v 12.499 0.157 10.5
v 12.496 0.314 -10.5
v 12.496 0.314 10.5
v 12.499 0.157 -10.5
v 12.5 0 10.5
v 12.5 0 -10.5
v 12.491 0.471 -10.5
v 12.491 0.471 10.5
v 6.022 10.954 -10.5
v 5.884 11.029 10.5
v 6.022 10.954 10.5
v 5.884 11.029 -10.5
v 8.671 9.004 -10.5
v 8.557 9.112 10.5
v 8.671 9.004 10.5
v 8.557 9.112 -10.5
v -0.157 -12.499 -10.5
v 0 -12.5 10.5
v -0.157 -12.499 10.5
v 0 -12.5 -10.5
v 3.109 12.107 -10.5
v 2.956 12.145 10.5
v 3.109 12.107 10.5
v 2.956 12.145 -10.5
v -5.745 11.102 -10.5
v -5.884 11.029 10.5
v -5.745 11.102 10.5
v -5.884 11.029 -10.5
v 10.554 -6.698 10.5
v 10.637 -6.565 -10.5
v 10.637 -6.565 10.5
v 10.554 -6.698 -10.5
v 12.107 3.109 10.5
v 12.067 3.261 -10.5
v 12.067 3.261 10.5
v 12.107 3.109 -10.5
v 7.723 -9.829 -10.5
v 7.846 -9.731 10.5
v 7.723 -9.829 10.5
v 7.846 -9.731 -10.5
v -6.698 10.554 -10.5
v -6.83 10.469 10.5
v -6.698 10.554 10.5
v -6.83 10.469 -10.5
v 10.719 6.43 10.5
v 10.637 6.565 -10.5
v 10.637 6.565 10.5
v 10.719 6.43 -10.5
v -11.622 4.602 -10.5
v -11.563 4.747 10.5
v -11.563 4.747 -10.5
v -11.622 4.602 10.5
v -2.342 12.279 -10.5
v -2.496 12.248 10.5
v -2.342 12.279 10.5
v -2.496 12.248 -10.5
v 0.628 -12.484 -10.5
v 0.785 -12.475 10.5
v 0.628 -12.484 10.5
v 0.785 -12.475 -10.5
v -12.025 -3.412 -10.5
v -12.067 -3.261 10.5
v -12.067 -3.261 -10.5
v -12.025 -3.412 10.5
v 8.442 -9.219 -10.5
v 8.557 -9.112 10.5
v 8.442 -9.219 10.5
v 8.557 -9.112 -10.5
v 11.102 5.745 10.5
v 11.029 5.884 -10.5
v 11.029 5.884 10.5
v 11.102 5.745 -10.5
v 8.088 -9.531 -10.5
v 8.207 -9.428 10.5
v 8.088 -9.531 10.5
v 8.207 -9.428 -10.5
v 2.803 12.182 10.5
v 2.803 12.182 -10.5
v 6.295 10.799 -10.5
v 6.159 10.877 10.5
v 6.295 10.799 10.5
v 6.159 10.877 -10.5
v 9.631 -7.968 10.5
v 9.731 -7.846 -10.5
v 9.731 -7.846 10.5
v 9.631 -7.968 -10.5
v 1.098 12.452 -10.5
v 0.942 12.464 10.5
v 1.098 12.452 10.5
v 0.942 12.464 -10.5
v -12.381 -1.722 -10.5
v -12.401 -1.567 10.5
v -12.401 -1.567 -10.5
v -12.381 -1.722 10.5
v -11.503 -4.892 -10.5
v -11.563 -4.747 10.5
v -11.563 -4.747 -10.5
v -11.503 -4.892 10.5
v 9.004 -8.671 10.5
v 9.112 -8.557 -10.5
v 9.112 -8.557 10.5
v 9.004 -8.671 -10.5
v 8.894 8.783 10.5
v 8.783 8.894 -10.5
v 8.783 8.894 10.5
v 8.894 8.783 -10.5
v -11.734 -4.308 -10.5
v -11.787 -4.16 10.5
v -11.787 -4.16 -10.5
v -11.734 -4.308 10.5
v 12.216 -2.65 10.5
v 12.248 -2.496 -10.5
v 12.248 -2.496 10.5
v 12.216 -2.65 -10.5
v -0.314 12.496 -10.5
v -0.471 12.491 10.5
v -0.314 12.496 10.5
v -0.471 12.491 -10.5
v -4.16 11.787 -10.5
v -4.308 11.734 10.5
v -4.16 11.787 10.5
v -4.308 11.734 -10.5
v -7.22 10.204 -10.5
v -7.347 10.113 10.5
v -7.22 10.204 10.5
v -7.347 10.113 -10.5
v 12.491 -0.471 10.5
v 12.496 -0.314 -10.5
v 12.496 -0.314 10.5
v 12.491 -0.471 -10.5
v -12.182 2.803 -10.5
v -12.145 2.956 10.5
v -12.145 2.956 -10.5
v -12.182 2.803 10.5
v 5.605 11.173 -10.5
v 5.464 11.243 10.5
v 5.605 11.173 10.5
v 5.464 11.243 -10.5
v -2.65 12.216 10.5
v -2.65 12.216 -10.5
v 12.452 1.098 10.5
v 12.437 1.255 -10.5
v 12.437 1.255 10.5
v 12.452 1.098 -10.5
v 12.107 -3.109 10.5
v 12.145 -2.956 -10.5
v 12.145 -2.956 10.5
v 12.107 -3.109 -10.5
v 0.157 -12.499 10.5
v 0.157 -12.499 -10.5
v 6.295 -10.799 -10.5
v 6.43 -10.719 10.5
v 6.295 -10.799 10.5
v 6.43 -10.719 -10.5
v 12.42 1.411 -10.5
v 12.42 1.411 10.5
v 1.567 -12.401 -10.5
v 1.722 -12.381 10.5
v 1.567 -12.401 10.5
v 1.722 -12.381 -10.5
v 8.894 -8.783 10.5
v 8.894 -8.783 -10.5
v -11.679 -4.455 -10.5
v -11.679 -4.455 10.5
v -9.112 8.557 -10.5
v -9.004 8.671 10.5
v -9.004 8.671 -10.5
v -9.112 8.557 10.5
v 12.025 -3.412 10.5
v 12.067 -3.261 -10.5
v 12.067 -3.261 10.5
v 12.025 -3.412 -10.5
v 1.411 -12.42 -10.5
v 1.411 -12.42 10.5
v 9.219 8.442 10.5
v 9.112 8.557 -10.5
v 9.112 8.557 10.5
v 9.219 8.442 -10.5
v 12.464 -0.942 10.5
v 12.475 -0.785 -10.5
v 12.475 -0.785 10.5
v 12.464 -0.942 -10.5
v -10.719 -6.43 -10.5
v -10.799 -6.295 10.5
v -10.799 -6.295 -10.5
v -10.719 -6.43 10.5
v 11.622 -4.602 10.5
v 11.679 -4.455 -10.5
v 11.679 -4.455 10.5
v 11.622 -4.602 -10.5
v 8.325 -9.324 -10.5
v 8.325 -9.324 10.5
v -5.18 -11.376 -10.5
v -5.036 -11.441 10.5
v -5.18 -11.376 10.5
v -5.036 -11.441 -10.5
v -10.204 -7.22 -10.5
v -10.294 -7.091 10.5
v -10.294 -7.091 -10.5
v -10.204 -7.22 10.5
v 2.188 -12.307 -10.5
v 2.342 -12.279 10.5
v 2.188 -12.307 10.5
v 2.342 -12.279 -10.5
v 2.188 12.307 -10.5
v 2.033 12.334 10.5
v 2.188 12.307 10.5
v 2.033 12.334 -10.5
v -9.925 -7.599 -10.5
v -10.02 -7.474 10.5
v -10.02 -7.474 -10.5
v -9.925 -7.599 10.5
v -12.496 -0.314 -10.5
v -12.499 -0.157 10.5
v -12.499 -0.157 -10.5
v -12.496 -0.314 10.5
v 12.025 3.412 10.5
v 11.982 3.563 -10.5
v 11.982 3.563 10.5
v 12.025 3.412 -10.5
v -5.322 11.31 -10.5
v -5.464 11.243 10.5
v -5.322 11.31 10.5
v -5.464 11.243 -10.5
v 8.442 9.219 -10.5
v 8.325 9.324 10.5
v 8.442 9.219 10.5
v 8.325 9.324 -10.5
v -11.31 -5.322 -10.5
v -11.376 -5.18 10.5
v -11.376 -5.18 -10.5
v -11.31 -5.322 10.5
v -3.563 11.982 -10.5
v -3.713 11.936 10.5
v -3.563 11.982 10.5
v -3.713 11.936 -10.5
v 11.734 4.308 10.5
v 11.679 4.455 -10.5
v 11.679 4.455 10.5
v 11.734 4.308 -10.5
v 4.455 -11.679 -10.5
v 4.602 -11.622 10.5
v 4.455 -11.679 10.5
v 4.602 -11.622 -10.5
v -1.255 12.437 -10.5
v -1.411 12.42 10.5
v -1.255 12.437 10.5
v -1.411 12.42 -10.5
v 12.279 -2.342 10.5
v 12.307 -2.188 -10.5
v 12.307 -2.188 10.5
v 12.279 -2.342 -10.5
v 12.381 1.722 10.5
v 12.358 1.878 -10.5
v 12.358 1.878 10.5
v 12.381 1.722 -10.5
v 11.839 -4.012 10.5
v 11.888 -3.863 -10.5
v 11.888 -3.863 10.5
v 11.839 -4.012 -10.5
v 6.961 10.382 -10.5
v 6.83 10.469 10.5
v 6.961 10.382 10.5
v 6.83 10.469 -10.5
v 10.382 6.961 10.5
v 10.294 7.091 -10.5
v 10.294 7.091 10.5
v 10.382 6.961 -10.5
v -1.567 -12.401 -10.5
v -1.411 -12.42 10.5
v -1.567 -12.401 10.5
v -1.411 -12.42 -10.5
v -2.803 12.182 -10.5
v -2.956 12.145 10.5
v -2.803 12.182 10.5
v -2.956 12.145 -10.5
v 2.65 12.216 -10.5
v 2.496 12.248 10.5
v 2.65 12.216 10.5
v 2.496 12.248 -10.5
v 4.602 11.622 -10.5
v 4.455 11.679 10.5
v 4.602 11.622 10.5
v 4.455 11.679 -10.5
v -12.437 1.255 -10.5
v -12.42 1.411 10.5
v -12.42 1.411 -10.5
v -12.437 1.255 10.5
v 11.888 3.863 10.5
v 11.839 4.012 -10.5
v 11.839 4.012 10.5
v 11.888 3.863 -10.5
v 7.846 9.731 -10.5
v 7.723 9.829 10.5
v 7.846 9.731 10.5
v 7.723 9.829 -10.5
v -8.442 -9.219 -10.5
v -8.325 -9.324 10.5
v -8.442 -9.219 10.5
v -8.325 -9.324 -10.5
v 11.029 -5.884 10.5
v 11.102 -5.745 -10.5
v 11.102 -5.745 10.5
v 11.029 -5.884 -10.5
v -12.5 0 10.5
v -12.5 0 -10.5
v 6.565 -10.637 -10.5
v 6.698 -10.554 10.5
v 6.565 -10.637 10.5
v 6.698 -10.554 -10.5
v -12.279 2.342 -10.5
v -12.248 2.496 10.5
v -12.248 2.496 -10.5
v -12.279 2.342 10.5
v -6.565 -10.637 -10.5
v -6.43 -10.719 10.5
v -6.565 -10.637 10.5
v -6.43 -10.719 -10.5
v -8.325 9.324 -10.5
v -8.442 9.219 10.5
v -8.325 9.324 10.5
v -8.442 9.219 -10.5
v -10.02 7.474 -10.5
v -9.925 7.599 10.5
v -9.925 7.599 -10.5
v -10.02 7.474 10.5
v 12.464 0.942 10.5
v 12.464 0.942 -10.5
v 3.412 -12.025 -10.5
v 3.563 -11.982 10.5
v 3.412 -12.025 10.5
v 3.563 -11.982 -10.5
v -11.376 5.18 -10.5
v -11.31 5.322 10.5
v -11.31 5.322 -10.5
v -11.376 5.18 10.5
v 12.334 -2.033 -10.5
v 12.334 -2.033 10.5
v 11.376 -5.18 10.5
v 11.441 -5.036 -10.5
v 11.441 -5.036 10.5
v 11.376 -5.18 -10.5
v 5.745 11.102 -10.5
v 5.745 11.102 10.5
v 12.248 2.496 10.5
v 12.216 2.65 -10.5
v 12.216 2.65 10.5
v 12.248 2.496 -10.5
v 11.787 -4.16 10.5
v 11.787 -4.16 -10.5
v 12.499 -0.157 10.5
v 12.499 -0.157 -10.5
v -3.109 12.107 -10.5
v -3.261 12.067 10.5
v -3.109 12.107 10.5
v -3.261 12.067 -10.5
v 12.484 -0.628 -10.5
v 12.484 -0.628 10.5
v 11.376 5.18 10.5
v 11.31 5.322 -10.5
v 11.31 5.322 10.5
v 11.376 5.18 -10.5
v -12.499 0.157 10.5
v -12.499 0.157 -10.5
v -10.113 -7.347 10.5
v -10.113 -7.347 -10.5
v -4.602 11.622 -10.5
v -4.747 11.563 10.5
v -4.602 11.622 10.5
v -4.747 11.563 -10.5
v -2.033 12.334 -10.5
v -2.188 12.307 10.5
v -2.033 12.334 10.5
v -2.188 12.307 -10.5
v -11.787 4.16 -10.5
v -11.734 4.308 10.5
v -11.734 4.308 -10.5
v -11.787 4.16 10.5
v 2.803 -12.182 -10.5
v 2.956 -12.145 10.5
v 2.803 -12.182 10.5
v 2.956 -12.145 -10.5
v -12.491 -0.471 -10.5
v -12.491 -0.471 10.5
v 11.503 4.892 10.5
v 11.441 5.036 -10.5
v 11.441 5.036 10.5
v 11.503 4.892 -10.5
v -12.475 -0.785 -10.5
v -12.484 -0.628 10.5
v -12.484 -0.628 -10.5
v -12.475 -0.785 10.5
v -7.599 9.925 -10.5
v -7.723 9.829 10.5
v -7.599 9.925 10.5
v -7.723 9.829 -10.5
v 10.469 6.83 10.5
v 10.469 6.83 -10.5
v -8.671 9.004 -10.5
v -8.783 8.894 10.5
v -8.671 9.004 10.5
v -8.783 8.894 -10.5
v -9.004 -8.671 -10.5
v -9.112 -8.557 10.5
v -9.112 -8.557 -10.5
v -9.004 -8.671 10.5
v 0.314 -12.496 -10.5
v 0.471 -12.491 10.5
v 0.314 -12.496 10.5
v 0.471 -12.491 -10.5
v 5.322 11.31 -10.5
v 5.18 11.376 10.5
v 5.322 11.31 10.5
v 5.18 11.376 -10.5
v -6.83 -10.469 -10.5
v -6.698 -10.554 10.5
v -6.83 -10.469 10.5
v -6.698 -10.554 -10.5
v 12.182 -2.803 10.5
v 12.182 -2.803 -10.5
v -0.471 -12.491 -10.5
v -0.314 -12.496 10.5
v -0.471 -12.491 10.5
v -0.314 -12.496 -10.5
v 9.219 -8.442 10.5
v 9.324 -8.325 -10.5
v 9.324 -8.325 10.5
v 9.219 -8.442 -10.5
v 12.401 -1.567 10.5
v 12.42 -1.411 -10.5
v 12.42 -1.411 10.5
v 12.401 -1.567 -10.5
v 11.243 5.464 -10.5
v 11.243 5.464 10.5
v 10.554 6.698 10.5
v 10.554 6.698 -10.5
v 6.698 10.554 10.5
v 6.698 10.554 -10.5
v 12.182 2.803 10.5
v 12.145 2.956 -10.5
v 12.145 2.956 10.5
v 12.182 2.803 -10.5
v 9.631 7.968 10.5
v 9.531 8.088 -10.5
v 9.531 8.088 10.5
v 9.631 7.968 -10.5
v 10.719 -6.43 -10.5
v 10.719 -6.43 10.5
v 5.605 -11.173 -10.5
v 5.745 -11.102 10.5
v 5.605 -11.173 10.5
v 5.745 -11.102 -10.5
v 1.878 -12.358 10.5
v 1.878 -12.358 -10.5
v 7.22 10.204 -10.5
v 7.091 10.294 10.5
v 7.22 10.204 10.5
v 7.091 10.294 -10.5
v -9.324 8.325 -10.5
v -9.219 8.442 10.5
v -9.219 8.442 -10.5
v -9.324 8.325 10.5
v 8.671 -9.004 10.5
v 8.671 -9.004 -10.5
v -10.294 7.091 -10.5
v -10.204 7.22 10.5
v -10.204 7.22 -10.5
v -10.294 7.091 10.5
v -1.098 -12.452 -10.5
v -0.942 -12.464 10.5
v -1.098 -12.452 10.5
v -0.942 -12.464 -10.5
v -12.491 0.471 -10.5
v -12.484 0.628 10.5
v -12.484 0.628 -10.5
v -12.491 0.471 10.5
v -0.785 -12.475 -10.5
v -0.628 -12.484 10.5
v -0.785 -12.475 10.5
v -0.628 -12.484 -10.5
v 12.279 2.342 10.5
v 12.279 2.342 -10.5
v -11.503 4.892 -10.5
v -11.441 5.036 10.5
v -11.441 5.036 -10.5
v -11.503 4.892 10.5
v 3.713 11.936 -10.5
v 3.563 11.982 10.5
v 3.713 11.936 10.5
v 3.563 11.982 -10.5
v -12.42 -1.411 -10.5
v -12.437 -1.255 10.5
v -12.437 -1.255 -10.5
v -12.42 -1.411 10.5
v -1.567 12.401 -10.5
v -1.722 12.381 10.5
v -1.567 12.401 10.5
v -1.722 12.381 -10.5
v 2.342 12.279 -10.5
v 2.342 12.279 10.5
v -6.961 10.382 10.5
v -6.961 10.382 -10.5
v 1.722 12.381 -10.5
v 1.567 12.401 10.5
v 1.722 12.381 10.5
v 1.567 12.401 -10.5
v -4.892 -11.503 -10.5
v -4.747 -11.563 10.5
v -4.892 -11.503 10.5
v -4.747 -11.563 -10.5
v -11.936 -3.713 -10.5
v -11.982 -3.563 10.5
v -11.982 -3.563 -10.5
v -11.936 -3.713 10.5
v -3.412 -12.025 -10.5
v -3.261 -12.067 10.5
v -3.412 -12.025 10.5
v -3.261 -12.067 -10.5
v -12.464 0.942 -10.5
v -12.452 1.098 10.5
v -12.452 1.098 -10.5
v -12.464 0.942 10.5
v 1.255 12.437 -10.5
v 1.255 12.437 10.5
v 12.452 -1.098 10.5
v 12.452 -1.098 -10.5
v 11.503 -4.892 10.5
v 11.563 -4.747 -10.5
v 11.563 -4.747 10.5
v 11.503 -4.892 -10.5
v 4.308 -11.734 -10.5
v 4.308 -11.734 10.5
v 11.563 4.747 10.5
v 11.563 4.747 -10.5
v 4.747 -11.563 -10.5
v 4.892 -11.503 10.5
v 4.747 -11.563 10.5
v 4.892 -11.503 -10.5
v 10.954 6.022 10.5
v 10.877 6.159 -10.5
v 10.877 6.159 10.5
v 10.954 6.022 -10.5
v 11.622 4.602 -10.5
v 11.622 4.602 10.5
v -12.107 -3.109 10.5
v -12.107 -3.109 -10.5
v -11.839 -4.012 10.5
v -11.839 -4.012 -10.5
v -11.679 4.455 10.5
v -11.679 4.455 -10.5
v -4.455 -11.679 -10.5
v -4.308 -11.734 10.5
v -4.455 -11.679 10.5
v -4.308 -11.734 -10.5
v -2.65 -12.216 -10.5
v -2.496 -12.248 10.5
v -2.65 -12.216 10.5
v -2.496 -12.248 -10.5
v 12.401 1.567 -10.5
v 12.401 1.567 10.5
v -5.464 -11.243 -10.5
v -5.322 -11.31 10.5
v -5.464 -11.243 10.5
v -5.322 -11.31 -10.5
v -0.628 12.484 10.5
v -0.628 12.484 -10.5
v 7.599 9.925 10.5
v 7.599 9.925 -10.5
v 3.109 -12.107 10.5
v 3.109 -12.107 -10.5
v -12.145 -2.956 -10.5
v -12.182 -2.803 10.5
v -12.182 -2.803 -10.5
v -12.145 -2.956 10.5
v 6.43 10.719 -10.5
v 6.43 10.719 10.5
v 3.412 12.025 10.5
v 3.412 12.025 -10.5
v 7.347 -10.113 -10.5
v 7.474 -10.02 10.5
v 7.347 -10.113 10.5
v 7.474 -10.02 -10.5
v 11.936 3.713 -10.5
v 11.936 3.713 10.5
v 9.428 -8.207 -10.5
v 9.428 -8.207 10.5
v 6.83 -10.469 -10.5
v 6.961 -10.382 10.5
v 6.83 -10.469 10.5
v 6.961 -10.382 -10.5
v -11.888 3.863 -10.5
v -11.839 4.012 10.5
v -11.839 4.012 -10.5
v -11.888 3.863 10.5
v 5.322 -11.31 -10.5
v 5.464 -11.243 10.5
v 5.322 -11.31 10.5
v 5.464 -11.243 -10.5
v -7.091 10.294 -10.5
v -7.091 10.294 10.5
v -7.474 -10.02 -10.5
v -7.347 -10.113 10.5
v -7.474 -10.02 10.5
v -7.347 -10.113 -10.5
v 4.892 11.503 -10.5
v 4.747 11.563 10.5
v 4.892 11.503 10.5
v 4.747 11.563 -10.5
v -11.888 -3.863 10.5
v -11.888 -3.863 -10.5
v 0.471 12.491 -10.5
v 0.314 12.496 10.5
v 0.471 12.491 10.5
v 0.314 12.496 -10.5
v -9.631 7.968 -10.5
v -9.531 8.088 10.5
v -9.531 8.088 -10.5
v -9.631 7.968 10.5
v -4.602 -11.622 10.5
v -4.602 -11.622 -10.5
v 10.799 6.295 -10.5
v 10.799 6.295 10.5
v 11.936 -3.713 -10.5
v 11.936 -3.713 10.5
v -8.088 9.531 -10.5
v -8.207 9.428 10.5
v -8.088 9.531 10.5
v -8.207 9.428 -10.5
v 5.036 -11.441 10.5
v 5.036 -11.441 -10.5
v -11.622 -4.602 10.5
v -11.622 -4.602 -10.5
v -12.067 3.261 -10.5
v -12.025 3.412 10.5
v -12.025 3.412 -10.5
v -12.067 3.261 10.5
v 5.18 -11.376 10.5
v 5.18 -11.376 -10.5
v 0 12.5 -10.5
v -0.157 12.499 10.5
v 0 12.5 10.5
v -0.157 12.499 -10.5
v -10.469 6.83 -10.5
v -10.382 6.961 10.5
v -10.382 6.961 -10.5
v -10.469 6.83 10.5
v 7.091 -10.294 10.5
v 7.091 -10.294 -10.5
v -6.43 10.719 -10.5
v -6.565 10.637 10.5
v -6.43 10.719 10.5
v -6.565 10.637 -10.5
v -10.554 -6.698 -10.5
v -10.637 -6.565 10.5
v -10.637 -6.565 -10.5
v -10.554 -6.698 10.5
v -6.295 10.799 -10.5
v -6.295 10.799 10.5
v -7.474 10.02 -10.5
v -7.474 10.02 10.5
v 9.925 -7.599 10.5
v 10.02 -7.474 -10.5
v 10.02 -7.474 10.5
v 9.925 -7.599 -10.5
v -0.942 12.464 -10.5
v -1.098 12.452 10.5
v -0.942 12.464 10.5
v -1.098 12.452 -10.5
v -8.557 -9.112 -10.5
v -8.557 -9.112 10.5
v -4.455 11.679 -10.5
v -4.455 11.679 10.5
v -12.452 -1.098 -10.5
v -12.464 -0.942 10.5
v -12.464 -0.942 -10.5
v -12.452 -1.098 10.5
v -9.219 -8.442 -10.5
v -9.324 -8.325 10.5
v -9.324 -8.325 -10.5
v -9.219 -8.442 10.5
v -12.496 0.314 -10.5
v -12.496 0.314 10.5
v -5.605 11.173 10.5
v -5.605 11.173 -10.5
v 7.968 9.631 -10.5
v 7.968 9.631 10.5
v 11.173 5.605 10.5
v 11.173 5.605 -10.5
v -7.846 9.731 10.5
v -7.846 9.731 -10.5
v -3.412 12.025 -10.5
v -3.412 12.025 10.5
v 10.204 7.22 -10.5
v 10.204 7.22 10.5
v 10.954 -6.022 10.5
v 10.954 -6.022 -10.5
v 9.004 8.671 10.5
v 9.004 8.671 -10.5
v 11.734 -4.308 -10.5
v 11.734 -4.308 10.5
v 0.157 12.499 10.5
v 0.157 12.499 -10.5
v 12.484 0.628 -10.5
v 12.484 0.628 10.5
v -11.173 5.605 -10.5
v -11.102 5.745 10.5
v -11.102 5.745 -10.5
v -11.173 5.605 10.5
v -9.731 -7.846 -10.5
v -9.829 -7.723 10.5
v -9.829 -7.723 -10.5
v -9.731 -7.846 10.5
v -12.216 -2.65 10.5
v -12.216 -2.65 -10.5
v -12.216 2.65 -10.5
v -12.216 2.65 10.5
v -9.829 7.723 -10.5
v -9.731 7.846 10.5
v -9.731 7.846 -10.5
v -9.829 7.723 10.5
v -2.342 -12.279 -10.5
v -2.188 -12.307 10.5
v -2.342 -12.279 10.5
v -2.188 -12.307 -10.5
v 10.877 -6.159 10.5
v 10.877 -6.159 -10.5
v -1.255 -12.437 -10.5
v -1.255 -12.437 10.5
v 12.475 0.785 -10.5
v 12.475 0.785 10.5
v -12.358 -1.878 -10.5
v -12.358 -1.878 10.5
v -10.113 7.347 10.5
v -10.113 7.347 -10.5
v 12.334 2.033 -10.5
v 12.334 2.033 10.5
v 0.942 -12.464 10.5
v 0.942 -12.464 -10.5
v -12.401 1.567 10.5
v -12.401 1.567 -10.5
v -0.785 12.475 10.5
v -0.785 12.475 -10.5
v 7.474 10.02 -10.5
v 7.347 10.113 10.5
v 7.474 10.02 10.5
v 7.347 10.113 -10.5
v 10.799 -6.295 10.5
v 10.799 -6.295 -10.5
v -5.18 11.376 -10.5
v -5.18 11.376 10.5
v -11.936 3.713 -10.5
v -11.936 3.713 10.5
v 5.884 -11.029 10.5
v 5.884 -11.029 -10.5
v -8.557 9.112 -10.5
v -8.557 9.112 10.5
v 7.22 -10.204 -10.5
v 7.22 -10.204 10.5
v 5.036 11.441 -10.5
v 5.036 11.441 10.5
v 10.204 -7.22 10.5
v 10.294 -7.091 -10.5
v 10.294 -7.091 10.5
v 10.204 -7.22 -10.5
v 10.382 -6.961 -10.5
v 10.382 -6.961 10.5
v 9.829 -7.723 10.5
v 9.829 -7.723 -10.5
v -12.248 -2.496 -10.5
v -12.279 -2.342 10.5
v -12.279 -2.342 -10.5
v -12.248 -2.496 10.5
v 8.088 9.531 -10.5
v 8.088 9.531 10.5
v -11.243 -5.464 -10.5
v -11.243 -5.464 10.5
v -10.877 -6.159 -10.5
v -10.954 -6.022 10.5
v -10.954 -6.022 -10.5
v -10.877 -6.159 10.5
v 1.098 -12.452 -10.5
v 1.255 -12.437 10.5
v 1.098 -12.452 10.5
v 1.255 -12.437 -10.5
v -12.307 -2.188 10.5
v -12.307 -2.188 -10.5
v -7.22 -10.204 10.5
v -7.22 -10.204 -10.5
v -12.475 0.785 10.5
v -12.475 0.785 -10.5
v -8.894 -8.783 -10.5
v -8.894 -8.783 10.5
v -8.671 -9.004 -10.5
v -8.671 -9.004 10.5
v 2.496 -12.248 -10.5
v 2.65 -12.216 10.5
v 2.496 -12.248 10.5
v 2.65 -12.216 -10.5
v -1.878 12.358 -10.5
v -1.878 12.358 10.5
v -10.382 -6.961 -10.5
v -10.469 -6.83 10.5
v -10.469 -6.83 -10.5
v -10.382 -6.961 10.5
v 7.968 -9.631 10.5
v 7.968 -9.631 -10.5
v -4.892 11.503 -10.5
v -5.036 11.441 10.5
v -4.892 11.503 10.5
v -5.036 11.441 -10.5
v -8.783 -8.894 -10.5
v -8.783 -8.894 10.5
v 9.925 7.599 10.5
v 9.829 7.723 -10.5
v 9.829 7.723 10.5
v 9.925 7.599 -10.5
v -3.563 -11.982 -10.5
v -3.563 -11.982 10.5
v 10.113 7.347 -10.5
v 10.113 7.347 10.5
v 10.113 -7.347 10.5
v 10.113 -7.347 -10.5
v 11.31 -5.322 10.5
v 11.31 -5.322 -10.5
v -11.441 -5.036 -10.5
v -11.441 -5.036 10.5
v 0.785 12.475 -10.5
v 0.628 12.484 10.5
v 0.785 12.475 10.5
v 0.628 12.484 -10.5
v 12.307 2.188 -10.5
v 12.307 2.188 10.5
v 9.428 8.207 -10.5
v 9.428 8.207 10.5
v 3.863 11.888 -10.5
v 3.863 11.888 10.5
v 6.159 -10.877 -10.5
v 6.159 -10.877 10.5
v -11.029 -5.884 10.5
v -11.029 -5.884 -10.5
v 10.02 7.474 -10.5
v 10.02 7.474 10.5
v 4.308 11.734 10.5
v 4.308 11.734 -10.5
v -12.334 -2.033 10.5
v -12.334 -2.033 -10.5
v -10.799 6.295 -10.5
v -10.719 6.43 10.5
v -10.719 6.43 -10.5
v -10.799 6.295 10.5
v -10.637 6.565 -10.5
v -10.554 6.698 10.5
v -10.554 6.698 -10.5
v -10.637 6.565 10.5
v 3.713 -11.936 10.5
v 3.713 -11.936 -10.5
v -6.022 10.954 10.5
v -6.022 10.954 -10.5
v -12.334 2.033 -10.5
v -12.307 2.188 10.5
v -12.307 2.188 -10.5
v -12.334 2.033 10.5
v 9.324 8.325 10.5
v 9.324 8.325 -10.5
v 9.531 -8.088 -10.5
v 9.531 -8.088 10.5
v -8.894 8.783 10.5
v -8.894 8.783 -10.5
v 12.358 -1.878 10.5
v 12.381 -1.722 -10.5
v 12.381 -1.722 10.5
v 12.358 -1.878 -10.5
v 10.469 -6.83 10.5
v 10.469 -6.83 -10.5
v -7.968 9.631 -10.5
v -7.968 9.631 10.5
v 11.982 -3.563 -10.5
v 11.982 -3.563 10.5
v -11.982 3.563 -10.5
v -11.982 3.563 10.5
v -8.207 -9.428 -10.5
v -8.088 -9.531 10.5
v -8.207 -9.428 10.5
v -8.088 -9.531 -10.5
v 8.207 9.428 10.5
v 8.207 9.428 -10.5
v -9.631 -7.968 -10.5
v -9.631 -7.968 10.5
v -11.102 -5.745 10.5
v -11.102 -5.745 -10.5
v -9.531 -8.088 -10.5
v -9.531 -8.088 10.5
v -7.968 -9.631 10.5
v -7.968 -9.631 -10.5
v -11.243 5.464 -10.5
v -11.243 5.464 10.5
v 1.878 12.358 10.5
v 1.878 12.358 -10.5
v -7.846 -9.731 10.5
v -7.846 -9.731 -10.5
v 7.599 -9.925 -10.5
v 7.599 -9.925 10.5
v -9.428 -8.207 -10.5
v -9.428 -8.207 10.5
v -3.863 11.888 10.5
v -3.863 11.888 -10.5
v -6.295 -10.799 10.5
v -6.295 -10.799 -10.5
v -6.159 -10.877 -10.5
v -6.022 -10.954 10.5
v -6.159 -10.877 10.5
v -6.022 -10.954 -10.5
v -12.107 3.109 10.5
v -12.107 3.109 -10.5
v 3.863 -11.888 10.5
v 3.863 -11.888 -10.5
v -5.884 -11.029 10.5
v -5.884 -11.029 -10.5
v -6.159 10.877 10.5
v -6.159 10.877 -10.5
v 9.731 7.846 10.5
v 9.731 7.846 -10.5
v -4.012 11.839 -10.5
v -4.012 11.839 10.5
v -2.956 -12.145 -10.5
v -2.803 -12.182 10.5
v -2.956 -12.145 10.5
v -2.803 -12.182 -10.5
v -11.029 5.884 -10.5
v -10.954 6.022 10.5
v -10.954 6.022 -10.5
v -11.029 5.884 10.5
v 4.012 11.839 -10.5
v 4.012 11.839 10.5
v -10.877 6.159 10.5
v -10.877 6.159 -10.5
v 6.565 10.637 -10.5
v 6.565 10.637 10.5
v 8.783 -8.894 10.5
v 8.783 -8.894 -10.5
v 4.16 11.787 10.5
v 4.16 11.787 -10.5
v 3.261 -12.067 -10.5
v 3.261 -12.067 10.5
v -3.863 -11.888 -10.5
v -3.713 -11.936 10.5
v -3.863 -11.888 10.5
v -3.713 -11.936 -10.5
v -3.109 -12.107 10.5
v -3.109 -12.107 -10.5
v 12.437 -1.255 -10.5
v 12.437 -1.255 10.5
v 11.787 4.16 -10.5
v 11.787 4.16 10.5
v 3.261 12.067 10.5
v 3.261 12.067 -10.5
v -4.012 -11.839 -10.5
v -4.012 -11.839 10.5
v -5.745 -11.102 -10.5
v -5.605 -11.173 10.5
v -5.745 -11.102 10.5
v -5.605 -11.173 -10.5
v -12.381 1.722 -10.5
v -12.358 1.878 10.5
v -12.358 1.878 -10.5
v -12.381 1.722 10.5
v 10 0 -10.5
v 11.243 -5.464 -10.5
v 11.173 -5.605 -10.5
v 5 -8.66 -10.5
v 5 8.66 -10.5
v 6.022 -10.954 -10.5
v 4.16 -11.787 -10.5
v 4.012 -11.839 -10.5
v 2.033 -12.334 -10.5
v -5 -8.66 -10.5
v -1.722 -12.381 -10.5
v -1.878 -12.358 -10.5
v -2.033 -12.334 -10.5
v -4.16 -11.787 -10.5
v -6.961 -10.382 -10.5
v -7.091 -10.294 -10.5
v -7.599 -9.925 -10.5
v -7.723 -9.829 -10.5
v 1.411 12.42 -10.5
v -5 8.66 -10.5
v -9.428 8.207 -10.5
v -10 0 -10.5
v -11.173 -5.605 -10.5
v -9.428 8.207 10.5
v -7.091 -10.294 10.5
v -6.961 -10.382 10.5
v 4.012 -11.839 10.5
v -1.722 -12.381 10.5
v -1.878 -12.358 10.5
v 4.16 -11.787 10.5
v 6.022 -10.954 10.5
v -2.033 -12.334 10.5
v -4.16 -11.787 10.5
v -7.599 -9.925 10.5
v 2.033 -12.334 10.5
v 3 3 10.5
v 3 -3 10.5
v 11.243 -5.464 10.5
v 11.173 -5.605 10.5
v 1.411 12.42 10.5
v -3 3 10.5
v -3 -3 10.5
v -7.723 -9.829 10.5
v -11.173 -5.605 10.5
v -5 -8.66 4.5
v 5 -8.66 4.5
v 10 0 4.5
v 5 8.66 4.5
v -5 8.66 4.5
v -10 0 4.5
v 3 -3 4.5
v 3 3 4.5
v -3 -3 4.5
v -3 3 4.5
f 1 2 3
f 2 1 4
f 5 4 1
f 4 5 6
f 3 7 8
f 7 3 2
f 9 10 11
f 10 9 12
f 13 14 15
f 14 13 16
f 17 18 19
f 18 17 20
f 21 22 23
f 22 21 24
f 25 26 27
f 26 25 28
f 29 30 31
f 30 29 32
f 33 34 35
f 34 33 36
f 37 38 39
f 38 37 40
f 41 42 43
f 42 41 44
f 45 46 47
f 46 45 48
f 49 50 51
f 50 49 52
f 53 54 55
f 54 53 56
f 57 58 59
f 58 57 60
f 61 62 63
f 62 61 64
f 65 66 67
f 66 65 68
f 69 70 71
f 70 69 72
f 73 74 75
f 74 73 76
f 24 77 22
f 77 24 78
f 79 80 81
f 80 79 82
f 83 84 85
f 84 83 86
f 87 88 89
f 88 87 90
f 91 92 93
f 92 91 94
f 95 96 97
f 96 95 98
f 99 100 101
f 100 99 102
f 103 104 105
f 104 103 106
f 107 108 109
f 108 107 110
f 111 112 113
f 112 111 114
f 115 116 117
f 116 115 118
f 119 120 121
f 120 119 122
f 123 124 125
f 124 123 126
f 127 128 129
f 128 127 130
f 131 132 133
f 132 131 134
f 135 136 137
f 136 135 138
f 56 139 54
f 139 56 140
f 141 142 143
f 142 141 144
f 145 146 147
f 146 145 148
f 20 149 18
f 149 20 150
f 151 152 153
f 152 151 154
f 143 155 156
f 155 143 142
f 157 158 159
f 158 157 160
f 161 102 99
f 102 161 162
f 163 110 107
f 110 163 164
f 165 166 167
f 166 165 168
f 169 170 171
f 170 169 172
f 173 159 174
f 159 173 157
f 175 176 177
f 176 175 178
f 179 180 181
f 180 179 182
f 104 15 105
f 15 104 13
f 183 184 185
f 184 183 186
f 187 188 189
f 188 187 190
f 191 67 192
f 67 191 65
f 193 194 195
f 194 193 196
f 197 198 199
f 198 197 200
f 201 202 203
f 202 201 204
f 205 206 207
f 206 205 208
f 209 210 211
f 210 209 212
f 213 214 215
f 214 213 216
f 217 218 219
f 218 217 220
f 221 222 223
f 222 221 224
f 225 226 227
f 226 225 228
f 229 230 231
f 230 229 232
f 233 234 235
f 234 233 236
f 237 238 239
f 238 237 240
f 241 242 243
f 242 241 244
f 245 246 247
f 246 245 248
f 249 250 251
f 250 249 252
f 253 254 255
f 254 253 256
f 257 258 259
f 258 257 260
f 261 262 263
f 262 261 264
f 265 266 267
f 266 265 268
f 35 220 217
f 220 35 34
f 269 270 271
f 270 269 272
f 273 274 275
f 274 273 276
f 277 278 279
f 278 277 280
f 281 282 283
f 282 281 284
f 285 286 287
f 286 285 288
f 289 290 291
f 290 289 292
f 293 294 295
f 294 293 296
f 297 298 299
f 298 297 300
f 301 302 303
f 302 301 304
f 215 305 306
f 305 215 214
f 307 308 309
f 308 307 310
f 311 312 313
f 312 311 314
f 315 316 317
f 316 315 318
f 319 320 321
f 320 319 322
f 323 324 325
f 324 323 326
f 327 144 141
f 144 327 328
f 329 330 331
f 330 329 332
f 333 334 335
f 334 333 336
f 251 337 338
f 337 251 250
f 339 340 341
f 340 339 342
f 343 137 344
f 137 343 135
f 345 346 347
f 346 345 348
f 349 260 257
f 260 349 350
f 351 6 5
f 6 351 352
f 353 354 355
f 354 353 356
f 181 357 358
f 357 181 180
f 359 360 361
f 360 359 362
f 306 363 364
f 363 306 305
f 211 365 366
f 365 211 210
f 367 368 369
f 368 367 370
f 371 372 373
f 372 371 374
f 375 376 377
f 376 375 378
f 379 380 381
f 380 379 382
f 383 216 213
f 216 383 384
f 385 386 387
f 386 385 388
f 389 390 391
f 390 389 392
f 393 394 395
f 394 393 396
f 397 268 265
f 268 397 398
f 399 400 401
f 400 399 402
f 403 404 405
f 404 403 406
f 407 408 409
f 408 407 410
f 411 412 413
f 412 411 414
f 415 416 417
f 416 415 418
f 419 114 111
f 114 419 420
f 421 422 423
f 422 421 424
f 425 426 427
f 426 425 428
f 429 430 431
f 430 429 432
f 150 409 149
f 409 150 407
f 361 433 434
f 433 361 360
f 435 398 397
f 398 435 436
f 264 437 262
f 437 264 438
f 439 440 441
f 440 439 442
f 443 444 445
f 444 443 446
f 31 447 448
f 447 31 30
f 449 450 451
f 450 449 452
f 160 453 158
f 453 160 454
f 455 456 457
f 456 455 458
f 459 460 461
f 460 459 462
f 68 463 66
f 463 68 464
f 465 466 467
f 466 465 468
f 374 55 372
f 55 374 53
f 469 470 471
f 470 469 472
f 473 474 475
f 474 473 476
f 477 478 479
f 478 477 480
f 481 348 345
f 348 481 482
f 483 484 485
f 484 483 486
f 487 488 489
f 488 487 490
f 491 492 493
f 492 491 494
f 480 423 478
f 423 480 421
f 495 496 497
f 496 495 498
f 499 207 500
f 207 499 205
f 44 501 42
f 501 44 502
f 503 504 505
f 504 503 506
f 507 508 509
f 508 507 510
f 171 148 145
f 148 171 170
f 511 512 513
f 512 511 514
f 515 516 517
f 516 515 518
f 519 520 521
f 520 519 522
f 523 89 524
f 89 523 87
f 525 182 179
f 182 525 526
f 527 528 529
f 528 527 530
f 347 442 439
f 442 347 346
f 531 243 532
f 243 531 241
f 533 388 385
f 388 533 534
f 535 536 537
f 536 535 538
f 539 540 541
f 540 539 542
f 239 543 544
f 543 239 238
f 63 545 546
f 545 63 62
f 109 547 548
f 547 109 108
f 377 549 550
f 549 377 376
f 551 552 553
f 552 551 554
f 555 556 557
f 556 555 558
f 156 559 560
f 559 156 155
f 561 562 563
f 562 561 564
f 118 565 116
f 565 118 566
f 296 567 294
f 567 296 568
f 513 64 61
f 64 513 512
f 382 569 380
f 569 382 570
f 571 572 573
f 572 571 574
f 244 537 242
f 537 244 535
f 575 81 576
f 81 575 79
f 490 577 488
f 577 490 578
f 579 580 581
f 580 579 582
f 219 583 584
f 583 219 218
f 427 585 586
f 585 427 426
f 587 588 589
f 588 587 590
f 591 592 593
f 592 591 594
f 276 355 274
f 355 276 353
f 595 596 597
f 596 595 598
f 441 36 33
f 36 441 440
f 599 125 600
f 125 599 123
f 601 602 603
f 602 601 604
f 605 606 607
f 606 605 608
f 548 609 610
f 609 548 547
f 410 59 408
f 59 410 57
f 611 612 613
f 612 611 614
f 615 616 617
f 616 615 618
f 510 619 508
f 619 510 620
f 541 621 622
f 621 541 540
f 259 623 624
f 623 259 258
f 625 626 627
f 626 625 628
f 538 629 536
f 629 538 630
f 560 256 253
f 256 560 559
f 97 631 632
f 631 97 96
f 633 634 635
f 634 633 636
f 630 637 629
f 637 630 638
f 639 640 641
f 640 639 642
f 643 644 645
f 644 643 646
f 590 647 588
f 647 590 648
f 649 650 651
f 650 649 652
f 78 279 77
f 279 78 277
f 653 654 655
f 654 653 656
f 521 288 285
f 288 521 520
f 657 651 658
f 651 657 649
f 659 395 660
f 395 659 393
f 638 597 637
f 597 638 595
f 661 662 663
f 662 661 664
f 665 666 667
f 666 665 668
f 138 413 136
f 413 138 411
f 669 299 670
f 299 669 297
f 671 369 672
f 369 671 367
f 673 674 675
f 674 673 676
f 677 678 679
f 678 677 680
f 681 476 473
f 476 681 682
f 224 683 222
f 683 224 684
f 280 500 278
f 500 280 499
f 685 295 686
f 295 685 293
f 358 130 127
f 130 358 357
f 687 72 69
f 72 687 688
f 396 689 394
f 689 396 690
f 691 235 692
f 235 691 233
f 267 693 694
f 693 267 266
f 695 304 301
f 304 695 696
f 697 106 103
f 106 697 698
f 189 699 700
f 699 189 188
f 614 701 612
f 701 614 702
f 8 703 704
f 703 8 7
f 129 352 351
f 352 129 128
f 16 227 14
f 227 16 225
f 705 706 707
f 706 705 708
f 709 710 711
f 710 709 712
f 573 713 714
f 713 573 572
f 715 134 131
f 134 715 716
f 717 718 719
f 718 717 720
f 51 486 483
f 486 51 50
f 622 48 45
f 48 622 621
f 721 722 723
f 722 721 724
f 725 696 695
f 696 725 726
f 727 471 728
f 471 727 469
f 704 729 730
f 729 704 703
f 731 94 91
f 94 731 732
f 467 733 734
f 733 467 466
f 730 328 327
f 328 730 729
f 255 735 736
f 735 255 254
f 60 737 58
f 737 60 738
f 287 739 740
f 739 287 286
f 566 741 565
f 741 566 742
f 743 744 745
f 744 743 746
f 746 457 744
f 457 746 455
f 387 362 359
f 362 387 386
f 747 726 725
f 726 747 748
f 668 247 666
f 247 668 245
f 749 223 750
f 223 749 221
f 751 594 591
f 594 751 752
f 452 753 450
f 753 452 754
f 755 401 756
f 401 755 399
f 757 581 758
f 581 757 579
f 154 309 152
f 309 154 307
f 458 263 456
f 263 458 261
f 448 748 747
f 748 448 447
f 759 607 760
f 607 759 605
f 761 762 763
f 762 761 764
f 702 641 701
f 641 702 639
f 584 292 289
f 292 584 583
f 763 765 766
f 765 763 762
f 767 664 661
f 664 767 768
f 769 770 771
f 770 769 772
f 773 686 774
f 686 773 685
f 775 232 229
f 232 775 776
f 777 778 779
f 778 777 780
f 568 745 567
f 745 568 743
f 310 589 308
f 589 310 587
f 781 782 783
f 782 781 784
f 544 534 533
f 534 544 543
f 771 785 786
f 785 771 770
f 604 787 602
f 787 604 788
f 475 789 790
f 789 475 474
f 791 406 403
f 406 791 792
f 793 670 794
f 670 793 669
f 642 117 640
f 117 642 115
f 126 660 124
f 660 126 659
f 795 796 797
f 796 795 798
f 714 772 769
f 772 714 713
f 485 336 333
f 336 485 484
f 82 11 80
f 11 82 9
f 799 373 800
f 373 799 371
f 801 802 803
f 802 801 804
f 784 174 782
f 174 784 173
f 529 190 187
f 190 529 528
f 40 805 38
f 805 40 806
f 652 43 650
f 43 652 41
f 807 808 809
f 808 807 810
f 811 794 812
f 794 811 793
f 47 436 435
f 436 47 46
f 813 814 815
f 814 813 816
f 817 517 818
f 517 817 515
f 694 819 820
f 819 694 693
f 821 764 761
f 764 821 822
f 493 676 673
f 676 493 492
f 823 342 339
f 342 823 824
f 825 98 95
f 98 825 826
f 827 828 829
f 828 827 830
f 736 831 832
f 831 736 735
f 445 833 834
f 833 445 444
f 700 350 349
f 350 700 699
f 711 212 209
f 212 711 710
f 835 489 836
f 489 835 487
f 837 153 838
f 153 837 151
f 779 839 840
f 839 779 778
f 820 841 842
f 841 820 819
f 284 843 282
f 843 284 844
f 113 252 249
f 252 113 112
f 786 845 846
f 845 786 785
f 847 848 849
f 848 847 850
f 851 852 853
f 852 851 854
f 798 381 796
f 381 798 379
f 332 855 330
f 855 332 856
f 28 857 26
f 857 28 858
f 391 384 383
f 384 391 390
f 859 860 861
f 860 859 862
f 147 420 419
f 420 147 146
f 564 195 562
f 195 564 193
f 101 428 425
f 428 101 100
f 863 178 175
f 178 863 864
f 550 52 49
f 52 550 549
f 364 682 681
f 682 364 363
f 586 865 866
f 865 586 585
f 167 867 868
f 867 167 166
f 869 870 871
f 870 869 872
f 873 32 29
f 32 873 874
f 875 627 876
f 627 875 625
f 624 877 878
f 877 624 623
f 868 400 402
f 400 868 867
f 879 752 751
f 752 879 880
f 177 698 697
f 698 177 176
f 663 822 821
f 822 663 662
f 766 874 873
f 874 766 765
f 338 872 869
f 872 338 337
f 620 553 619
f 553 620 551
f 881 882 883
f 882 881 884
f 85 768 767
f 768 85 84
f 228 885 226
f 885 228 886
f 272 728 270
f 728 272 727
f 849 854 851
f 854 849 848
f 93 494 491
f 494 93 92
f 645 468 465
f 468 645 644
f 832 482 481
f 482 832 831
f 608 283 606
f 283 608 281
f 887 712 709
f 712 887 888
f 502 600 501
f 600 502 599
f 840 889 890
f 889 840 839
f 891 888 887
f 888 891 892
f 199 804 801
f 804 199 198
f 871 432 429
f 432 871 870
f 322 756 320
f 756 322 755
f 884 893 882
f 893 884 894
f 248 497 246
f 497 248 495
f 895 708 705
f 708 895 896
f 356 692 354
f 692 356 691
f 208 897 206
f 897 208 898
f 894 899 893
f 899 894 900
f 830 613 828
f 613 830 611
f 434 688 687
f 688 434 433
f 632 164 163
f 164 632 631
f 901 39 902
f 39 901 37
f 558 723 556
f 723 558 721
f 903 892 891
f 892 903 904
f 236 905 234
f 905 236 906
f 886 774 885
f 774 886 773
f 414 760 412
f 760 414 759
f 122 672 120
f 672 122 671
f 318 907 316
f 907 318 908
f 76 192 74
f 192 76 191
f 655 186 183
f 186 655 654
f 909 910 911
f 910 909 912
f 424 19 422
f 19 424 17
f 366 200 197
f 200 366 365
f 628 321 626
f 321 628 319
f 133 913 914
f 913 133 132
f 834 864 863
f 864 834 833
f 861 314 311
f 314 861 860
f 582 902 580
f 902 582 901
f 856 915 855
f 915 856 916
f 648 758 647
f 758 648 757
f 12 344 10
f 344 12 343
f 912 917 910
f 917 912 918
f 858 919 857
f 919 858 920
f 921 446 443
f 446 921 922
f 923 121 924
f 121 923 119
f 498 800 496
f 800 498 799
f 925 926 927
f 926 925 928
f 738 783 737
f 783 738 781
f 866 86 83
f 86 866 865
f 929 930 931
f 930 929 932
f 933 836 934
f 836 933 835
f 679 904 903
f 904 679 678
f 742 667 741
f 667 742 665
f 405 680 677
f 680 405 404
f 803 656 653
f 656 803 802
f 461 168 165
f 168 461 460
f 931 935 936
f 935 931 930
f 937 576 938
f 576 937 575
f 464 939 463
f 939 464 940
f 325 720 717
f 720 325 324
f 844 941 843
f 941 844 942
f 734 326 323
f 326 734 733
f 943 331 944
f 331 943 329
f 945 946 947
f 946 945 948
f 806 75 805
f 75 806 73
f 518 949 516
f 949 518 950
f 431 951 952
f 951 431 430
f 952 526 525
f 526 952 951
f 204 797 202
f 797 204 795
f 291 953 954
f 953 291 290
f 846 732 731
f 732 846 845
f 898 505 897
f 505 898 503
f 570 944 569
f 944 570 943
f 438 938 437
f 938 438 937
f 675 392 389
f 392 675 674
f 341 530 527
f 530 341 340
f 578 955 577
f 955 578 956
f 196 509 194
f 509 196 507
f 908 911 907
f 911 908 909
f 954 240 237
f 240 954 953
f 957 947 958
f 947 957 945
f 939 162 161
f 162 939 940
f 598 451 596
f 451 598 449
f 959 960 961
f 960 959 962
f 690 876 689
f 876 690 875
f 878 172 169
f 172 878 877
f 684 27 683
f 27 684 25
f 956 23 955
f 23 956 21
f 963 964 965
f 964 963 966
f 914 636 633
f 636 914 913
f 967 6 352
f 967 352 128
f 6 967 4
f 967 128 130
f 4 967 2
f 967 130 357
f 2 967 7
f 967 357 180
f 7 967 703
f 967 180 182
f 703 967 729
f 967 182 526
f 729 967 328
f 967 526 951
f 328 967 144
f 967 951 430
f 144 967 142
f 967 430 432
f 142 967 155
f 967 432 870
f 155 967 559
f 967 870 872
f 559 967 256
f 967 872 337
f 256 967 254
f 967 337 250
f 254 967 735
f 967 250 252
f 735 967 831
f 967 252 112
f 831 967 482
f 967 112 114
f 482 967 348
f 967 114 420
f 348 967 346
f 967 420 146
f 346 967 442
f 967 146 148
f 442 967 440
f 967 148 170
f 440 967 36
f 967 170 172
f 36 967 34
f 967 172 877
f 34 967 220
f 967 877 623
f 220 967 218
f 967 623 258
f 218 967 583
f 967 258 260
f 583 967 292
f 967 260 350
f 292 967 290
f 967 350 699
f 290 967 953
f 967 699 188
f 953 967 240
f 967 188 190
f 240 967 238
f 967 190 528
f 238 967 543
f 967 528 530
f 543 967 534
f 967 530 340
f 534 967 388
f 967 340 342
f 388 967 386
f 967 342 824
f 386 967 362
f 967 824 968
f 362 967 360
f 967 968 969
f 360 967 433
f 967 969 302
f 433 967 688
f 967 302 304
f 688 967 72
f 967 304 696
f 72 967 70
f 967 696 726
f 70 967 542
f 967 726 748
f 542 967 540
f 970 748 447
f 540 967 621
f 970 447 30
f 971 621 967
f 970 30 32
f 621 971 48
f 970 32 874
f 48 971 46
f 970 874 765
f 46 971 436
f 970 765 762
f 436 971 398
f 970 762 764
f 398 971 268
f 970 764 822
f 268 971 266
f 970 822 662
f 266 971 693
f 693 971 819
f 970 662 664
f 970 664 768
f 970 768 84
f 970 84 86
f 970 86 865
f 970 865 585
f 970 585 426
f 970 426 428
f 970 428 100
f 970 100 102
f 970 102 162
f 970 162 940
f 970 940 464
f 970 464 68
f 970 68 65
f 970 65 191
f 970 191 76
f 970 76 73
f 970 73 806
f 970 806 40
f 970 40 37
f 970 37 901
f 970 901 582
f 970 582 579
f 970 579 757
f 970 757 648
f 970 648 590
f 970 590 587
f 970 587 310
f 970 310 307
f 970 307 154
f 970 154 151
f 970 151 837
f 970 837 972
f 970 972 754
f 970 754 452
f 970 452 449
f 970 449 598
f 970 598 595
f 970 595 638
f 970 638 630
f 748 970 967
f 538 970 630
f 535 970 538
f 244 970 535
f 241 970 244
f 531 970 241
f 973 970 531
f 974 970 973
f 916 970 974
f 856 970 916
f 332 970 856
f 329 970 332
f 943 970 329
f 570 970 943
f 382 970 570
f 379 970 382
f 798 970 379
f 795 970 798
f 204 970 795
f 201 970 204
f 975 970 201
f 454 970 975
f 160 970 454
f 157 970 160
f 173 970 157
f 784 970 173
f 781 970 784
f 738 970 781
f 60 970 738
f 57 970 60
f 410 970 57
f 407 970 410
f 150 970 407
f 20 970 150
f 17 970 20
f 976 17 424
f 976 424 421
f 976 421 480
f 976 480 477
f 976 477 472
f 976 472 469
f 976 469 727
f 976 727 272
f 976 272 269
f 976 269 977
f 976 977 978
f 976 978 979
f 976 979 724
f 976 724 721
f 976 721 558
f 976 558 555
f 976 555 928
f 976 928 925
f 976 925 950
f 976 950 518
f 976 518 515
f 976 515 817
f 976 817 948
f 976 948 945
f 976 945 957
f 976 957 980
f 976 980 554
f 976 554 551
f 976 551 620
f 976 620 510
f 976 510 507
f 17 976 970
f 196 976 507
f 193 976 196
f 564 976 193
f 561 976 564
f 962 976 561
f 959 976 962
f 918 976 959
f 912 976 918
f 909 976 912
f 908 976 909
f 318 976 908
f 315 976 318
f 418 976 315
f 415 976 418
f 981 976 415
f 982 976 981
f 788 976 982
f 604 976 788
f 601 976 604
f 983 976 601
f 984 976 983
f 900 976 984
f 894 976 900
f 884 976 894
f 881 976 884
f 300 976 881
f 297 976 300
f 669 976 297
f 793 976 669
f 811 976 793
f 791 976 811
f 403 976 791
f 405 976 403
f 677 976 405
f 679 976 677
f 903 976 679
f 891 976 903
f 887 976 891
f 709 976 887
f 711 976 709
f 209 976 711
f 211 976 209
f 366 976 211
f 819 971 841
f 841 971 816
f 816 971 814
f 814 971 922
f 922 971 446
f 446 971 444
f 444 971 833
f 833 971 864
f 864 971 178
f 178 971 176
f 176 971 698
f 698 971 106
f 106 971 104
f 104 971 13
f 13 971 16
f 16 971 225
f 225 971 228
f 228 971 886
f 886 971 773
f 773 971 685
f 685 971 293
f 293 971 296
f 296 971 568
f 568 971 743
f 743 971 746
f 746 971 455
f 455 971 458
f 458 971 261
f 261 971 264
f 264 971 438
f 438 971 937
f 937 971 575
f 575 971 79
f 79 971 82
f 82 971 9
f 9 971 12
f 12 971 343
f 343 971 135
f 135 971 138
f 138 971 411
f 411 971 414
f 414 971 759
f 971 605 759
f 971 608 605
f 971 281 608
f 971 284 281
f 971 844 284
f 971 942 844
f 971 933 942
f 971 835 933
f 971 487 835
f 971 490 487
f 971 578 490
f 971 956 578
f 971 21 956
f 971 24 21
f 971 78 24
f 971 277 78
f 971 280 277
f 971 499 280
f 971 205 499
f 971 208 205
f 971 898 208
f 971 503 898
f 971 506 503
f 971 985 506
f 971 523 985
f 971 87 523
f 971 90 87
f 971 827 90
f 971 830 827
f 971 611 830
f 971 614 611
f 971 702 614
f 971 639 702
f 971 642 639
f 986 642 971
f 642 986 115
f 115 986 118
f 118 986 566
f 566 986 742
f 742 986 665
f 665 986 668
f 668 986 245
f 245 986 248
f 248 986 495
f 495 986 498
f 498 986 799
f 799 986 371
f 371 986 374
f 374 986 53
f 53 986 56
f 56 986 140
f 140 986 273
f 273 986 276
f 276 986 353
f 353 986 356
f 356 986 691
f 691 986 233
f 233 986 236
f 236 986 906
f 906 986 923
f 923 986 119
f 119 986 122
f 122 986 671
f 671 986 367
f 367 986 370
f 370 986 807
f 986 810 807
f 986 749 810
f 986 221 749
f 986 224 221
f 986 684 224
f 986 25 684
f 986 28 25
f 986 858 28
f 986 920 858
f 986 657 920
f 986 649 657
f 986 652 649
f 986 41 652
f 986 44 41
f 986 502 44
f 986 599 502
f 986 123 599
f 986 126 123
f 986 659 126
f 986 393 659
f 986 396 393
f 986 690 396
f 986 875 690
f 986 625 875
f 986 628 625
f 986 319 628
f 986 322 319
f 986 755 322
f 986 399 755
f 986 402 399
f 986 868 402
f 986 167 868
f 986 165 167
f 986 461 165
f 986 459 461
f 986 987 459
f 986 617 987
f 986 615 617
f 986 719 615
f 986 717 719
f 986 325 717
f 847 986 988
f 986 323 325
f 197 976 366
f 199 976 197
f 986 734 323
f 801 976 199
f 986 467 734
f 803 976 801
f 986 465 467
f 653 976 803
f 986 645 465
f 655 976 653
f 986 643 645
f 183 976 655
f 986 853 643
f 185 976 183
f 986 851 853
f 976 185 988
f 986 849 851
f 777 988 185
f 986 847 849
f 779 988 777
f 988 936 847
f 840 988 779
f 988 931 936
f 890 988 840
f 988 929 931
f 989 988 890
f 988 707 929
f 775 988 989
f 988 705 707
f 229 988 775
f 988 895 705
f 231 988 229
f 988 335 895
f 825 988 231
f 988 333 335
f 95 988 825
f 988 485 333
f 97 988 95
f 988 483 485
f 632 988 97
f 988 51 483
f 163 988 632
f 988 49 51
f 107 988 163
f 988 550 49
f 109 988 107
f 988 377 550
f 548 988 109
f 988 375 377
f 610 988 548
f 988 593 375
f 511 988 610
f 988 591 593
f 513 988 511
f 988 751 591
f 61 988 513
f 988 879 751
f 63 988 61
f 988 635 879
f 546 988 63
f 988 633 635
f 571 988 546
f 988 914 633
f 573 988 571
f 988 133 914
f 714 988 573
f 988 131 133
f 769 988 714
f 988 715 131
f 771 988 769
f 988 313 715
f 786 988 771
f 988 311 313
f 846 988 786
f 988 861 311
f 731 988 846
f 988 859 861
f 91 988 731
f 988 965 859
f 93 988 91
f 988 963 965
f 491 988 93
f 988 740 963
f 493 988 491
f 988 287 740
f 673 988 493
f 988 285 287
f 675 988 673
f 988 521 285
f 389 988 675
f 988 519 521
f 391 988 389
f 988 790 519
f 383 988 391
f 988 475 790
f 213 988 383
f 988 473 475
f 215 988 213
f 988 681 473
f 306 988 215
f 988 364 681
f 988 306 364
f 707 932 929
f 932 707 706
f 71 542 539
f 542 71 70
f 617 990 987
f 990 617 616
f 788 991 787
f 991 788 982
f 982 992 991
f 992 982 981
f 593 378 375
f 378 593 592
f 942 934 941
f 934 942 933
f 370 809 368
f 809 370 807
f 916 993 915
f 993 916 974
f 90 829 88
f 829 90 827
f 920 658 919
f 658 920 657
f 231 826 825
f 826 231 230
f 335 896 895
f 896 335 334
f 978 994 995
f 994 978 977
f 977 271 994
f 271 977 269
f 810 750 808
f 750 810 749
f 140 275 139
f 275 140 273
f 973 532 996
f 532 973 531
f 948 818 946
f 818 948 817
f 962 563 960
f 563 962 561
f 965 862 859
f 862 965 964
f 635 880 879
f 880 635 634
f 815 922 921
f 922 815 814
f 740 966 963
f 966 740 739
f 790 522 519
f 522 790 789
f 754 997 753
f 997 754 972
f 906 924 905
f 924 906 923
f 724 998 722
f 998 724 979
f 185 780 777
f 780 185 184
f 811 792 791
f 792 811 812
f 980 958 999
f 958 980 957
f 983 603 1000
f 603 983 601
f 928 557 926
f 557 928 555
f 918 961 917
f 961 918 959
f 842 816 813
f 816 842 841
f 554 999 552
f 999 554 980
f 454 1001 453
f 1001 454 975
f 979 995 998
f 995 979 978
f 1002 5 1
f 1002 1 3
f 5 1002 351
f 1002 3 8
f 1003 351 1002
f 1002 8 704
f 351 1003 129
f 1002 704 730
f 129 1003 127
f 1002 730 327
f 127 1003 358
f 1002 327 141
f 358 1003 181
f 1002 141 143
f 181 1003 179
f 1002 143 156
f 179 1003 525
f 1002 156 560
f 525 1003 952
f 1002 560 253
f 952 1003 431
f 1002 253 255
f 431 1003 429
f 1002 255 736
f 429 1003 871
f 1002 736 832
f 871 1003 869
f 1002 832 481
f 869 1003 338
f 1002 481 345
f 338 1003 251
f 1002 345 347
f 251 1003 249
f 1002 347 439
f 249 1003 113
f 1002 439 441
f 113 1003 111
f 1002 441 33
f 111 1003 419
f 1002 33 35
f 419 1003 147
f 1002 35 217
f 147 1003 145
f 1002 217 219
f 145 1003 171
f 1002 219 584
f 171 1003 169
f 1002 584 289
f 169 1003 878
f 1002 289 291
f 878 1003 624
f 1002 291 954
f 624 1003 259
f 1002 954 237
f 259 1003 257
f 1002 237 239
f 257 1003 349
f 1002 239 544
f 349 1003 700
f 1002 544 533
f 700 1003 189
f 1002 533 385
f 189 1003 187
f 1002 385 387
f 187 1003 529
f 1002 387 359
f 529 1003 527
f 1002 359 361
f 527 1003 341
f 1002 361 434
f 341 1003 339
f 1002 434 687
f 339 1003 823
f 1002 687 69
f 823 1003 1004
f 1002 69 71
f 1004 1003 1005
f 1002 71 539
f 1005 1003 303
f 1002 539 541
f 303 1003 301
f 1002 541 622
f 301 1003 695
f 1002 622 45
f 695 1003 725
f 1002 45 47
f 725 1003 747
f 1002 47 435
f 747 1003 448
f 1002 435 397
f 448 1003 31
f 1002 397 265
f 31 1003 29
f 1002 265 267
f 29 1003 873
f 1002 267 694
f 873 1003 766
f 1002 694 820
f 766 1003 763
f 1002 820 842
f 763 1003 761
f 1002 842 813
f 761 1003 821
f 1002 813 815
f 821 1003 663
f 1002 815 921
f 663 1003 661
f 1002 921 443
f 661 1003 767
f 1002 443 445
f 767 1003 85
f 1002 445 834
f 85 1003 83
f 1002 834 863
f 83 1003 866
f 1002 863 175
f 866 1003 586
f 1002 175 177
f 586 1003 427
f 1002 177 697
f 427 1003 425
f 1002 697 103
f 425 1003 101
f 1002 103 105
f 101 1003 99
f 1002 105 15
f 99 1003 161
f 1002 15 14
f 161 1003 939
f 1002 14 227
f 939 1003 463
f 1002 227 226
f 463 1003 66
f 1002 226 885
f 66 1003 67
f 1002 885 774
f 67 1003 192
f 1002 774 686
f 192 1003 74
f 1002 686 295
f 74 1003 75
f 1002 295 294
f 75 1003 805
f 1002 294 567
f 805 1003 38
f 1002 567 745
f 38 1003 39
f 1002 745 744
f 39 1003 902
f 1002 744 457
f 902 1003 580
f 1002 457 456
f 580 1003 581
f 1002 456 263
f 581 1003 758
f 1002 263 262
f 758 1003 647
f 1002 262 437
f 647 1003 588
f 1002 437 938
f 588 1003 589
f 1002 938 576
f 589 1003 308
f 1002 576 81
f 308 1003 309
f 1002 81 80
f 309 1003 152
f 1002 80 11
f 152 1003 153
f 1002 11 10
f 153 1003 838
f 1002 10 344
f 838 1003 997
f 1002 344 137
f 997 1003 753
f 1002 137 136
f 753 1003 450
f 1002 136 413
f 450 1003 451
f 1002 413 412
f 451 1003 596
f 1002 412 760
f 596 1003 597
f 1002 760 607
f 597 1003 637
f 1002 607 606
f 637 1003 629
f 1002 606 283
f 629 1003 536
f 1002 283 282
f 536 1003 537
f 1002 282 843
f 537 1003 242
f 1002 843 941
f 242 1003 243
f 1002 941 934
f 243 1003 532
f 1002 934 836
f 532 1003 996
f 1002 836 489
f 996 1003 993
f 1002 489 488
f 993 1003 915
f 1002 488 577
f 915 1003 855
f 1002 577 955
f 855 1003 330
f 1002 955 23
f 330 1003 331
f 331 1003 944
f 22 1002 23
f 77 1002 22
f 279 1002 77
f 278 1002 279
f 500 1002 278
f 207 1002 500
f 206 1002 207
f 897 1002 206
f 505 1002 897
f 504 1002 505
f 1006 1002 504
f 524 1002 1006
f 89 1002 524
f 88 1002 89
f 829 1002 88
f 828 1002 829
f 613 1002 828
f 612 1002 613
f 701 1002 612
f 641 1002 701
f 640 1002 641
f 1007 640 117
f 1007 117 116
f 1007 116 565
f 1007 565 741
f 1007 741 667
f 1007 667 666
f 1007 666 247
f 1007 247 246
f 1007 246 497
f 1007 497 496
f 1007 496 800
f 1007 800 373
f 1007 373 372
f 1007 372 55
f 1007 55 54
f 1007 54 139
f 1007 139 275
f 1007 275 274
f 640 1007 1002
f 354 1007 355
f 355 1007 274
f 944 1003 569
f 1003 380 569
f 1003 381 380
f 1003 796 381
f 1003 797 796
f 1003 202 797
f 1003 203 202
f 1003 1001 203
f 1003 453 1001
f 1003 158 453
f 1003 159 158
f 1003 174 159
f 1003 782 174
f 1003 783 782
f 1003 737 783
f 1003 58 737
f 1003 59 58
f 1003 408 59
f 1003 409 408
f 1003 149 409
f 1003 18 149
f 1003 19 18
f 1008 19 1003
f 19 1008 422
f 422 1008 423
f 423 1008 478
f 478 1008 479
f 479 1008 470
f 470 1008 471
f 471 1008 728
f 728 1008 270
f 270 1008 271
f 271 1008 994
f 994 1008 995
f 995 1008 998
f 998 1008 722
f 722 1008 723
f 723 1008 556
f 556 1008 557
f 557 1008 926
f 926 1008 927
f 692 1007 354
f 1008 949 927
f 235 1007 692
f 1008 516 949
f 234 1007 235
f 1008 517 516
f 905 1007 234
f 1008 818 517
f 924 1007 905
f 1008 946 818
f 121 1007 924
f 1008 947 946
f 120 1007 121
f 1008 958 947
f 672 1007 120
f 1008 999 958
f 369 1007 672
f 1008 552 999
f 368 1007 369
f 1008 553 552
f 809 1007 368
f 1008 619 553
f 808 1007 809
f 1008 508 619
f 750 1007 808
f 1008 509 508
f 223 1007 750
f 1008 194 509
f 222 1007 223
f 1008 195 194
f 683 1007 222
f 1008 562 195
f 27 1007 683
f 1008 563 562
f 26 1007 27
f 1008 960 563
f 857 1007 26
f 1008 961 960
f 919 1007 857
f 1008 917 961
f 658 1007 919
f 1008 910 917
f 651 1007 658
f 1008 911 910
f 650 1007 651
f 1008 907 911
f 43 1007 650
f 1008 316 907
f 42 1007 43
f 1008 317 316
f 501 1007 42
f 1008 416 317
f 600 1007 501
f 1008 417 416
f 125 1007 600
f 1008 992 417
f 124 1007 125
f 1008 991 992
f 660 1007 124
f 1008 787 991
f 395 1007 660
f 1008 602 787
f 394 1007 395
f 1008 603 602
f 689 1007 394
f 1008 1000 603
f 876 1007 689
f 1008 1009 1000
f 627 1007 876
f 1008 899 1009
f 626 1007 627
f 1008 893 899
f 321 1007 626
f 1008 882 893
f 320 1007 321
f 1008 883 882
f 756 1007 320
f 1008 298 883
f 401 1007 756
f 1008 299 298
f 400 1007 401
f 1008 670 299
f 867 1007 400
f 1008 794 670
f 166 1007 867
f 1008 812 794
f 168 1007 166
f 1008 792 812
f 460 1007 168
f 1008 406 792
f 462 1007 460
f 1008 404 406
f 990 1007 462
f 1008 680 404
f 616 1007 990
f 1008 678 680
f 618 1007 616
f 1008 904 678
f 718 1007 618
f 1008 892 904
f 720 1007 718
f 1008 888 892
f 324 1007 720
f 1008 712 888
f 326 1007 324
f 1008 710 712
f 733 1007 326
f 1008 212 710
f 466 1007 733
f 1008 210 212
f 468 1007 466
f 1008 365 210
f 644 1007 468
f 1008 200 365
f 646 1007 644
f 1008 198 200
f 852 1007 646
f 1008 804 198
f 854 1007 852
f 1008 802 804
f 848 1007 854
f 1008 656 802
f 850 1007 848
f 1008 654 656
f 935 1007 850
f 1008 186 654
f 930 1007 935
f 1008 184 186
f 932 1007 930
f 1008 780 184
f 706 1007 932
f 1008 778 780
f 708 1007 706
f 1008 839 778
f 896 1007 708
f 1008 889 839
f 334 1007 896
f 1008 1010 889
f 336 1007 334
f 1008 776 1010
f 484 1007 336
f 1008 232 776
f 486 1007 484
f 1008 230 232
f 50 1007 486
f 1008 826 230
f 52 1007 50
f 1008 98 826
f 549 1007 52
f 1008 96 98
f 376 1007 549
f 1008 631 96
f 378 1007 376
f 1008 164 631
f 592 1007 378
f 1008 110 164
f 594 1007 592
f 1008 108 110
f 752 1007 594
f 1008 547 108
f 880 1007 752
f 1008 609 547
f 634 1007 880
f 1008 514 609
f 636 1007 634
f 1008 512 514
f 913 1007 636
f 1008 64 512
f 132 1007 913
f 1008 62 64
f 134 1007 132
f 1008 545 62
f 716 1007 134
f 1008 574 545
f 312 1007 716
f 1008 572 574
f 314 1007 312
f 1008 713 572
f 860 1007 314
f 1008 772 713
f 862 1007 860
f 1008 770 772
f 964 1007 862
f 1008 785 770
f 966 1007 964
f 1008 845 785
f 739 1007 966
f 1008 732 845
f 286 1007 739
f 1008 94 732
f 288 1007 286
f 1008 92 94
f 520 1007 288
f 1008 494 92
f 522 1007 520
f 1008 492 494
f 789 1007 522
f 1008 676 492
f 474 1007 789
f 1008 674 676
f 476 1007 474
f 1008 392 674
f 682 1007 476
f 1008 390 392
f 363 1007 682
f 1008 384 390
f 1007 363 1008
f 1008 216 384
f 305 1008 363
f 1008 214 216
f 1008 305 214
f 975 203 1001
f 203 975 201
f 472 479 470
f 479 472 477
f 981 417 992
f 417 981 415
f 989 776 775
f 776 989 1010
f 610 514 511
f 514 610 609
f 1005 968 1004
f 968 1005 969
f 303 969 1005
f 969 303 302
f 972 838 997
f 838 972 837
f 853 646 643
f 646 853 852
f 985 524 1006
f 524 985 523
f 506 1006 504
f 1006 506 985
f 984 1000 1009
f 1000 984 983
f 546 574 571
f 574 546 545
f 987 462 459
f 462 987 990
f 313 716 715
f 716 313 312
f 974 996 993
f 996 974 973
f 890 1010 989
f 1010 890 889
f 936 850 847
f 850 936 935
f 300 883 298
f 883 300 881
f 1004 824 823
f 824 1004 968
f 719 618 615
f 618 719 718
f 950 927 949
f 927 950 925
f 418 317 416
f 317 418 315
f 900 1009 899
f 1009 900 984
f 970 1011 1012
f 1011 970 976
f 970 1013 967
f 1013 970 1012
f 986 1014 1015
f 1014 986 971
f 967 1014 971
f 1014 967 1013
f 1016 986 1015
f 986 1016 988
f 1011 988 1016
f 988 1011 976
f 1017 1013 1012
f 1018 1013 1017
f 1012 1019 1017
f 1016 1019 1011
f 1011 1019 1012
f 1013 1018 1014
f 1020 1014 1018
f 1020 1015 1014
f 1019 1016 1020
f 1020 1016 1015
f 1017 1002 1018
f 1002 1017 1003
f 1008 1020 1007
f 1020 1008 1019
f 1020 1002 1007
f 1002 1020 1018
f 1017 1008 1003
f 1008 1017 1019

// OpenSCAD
//Hex bolt socket design
//Measuremesnts in mm'

//Ratchet sqaure drive size
S=6;

// Socket Depth
D=15;

// Fastener Head size
H=10;

//Resolution of outer socket layer 
$fn=500;


   module Socket(){
 difference(){
 difference(){
 //Socket outer body
cylinder(h=D+S, r=1.25*H, center=true);
 //Socket inner hex
translate (v=[0,0,-(S/2)-(D/2)]) cylinder($fn=6,h=D, r=H, center=false);     
     //Head and cap
 }
 //Remove square for ratchet drive
  translate (v=[-(S/2),-(S/2),(D/2)-(S/2)]) cube([S,S,S+1],center=false);          
 }} 
      Socket();
